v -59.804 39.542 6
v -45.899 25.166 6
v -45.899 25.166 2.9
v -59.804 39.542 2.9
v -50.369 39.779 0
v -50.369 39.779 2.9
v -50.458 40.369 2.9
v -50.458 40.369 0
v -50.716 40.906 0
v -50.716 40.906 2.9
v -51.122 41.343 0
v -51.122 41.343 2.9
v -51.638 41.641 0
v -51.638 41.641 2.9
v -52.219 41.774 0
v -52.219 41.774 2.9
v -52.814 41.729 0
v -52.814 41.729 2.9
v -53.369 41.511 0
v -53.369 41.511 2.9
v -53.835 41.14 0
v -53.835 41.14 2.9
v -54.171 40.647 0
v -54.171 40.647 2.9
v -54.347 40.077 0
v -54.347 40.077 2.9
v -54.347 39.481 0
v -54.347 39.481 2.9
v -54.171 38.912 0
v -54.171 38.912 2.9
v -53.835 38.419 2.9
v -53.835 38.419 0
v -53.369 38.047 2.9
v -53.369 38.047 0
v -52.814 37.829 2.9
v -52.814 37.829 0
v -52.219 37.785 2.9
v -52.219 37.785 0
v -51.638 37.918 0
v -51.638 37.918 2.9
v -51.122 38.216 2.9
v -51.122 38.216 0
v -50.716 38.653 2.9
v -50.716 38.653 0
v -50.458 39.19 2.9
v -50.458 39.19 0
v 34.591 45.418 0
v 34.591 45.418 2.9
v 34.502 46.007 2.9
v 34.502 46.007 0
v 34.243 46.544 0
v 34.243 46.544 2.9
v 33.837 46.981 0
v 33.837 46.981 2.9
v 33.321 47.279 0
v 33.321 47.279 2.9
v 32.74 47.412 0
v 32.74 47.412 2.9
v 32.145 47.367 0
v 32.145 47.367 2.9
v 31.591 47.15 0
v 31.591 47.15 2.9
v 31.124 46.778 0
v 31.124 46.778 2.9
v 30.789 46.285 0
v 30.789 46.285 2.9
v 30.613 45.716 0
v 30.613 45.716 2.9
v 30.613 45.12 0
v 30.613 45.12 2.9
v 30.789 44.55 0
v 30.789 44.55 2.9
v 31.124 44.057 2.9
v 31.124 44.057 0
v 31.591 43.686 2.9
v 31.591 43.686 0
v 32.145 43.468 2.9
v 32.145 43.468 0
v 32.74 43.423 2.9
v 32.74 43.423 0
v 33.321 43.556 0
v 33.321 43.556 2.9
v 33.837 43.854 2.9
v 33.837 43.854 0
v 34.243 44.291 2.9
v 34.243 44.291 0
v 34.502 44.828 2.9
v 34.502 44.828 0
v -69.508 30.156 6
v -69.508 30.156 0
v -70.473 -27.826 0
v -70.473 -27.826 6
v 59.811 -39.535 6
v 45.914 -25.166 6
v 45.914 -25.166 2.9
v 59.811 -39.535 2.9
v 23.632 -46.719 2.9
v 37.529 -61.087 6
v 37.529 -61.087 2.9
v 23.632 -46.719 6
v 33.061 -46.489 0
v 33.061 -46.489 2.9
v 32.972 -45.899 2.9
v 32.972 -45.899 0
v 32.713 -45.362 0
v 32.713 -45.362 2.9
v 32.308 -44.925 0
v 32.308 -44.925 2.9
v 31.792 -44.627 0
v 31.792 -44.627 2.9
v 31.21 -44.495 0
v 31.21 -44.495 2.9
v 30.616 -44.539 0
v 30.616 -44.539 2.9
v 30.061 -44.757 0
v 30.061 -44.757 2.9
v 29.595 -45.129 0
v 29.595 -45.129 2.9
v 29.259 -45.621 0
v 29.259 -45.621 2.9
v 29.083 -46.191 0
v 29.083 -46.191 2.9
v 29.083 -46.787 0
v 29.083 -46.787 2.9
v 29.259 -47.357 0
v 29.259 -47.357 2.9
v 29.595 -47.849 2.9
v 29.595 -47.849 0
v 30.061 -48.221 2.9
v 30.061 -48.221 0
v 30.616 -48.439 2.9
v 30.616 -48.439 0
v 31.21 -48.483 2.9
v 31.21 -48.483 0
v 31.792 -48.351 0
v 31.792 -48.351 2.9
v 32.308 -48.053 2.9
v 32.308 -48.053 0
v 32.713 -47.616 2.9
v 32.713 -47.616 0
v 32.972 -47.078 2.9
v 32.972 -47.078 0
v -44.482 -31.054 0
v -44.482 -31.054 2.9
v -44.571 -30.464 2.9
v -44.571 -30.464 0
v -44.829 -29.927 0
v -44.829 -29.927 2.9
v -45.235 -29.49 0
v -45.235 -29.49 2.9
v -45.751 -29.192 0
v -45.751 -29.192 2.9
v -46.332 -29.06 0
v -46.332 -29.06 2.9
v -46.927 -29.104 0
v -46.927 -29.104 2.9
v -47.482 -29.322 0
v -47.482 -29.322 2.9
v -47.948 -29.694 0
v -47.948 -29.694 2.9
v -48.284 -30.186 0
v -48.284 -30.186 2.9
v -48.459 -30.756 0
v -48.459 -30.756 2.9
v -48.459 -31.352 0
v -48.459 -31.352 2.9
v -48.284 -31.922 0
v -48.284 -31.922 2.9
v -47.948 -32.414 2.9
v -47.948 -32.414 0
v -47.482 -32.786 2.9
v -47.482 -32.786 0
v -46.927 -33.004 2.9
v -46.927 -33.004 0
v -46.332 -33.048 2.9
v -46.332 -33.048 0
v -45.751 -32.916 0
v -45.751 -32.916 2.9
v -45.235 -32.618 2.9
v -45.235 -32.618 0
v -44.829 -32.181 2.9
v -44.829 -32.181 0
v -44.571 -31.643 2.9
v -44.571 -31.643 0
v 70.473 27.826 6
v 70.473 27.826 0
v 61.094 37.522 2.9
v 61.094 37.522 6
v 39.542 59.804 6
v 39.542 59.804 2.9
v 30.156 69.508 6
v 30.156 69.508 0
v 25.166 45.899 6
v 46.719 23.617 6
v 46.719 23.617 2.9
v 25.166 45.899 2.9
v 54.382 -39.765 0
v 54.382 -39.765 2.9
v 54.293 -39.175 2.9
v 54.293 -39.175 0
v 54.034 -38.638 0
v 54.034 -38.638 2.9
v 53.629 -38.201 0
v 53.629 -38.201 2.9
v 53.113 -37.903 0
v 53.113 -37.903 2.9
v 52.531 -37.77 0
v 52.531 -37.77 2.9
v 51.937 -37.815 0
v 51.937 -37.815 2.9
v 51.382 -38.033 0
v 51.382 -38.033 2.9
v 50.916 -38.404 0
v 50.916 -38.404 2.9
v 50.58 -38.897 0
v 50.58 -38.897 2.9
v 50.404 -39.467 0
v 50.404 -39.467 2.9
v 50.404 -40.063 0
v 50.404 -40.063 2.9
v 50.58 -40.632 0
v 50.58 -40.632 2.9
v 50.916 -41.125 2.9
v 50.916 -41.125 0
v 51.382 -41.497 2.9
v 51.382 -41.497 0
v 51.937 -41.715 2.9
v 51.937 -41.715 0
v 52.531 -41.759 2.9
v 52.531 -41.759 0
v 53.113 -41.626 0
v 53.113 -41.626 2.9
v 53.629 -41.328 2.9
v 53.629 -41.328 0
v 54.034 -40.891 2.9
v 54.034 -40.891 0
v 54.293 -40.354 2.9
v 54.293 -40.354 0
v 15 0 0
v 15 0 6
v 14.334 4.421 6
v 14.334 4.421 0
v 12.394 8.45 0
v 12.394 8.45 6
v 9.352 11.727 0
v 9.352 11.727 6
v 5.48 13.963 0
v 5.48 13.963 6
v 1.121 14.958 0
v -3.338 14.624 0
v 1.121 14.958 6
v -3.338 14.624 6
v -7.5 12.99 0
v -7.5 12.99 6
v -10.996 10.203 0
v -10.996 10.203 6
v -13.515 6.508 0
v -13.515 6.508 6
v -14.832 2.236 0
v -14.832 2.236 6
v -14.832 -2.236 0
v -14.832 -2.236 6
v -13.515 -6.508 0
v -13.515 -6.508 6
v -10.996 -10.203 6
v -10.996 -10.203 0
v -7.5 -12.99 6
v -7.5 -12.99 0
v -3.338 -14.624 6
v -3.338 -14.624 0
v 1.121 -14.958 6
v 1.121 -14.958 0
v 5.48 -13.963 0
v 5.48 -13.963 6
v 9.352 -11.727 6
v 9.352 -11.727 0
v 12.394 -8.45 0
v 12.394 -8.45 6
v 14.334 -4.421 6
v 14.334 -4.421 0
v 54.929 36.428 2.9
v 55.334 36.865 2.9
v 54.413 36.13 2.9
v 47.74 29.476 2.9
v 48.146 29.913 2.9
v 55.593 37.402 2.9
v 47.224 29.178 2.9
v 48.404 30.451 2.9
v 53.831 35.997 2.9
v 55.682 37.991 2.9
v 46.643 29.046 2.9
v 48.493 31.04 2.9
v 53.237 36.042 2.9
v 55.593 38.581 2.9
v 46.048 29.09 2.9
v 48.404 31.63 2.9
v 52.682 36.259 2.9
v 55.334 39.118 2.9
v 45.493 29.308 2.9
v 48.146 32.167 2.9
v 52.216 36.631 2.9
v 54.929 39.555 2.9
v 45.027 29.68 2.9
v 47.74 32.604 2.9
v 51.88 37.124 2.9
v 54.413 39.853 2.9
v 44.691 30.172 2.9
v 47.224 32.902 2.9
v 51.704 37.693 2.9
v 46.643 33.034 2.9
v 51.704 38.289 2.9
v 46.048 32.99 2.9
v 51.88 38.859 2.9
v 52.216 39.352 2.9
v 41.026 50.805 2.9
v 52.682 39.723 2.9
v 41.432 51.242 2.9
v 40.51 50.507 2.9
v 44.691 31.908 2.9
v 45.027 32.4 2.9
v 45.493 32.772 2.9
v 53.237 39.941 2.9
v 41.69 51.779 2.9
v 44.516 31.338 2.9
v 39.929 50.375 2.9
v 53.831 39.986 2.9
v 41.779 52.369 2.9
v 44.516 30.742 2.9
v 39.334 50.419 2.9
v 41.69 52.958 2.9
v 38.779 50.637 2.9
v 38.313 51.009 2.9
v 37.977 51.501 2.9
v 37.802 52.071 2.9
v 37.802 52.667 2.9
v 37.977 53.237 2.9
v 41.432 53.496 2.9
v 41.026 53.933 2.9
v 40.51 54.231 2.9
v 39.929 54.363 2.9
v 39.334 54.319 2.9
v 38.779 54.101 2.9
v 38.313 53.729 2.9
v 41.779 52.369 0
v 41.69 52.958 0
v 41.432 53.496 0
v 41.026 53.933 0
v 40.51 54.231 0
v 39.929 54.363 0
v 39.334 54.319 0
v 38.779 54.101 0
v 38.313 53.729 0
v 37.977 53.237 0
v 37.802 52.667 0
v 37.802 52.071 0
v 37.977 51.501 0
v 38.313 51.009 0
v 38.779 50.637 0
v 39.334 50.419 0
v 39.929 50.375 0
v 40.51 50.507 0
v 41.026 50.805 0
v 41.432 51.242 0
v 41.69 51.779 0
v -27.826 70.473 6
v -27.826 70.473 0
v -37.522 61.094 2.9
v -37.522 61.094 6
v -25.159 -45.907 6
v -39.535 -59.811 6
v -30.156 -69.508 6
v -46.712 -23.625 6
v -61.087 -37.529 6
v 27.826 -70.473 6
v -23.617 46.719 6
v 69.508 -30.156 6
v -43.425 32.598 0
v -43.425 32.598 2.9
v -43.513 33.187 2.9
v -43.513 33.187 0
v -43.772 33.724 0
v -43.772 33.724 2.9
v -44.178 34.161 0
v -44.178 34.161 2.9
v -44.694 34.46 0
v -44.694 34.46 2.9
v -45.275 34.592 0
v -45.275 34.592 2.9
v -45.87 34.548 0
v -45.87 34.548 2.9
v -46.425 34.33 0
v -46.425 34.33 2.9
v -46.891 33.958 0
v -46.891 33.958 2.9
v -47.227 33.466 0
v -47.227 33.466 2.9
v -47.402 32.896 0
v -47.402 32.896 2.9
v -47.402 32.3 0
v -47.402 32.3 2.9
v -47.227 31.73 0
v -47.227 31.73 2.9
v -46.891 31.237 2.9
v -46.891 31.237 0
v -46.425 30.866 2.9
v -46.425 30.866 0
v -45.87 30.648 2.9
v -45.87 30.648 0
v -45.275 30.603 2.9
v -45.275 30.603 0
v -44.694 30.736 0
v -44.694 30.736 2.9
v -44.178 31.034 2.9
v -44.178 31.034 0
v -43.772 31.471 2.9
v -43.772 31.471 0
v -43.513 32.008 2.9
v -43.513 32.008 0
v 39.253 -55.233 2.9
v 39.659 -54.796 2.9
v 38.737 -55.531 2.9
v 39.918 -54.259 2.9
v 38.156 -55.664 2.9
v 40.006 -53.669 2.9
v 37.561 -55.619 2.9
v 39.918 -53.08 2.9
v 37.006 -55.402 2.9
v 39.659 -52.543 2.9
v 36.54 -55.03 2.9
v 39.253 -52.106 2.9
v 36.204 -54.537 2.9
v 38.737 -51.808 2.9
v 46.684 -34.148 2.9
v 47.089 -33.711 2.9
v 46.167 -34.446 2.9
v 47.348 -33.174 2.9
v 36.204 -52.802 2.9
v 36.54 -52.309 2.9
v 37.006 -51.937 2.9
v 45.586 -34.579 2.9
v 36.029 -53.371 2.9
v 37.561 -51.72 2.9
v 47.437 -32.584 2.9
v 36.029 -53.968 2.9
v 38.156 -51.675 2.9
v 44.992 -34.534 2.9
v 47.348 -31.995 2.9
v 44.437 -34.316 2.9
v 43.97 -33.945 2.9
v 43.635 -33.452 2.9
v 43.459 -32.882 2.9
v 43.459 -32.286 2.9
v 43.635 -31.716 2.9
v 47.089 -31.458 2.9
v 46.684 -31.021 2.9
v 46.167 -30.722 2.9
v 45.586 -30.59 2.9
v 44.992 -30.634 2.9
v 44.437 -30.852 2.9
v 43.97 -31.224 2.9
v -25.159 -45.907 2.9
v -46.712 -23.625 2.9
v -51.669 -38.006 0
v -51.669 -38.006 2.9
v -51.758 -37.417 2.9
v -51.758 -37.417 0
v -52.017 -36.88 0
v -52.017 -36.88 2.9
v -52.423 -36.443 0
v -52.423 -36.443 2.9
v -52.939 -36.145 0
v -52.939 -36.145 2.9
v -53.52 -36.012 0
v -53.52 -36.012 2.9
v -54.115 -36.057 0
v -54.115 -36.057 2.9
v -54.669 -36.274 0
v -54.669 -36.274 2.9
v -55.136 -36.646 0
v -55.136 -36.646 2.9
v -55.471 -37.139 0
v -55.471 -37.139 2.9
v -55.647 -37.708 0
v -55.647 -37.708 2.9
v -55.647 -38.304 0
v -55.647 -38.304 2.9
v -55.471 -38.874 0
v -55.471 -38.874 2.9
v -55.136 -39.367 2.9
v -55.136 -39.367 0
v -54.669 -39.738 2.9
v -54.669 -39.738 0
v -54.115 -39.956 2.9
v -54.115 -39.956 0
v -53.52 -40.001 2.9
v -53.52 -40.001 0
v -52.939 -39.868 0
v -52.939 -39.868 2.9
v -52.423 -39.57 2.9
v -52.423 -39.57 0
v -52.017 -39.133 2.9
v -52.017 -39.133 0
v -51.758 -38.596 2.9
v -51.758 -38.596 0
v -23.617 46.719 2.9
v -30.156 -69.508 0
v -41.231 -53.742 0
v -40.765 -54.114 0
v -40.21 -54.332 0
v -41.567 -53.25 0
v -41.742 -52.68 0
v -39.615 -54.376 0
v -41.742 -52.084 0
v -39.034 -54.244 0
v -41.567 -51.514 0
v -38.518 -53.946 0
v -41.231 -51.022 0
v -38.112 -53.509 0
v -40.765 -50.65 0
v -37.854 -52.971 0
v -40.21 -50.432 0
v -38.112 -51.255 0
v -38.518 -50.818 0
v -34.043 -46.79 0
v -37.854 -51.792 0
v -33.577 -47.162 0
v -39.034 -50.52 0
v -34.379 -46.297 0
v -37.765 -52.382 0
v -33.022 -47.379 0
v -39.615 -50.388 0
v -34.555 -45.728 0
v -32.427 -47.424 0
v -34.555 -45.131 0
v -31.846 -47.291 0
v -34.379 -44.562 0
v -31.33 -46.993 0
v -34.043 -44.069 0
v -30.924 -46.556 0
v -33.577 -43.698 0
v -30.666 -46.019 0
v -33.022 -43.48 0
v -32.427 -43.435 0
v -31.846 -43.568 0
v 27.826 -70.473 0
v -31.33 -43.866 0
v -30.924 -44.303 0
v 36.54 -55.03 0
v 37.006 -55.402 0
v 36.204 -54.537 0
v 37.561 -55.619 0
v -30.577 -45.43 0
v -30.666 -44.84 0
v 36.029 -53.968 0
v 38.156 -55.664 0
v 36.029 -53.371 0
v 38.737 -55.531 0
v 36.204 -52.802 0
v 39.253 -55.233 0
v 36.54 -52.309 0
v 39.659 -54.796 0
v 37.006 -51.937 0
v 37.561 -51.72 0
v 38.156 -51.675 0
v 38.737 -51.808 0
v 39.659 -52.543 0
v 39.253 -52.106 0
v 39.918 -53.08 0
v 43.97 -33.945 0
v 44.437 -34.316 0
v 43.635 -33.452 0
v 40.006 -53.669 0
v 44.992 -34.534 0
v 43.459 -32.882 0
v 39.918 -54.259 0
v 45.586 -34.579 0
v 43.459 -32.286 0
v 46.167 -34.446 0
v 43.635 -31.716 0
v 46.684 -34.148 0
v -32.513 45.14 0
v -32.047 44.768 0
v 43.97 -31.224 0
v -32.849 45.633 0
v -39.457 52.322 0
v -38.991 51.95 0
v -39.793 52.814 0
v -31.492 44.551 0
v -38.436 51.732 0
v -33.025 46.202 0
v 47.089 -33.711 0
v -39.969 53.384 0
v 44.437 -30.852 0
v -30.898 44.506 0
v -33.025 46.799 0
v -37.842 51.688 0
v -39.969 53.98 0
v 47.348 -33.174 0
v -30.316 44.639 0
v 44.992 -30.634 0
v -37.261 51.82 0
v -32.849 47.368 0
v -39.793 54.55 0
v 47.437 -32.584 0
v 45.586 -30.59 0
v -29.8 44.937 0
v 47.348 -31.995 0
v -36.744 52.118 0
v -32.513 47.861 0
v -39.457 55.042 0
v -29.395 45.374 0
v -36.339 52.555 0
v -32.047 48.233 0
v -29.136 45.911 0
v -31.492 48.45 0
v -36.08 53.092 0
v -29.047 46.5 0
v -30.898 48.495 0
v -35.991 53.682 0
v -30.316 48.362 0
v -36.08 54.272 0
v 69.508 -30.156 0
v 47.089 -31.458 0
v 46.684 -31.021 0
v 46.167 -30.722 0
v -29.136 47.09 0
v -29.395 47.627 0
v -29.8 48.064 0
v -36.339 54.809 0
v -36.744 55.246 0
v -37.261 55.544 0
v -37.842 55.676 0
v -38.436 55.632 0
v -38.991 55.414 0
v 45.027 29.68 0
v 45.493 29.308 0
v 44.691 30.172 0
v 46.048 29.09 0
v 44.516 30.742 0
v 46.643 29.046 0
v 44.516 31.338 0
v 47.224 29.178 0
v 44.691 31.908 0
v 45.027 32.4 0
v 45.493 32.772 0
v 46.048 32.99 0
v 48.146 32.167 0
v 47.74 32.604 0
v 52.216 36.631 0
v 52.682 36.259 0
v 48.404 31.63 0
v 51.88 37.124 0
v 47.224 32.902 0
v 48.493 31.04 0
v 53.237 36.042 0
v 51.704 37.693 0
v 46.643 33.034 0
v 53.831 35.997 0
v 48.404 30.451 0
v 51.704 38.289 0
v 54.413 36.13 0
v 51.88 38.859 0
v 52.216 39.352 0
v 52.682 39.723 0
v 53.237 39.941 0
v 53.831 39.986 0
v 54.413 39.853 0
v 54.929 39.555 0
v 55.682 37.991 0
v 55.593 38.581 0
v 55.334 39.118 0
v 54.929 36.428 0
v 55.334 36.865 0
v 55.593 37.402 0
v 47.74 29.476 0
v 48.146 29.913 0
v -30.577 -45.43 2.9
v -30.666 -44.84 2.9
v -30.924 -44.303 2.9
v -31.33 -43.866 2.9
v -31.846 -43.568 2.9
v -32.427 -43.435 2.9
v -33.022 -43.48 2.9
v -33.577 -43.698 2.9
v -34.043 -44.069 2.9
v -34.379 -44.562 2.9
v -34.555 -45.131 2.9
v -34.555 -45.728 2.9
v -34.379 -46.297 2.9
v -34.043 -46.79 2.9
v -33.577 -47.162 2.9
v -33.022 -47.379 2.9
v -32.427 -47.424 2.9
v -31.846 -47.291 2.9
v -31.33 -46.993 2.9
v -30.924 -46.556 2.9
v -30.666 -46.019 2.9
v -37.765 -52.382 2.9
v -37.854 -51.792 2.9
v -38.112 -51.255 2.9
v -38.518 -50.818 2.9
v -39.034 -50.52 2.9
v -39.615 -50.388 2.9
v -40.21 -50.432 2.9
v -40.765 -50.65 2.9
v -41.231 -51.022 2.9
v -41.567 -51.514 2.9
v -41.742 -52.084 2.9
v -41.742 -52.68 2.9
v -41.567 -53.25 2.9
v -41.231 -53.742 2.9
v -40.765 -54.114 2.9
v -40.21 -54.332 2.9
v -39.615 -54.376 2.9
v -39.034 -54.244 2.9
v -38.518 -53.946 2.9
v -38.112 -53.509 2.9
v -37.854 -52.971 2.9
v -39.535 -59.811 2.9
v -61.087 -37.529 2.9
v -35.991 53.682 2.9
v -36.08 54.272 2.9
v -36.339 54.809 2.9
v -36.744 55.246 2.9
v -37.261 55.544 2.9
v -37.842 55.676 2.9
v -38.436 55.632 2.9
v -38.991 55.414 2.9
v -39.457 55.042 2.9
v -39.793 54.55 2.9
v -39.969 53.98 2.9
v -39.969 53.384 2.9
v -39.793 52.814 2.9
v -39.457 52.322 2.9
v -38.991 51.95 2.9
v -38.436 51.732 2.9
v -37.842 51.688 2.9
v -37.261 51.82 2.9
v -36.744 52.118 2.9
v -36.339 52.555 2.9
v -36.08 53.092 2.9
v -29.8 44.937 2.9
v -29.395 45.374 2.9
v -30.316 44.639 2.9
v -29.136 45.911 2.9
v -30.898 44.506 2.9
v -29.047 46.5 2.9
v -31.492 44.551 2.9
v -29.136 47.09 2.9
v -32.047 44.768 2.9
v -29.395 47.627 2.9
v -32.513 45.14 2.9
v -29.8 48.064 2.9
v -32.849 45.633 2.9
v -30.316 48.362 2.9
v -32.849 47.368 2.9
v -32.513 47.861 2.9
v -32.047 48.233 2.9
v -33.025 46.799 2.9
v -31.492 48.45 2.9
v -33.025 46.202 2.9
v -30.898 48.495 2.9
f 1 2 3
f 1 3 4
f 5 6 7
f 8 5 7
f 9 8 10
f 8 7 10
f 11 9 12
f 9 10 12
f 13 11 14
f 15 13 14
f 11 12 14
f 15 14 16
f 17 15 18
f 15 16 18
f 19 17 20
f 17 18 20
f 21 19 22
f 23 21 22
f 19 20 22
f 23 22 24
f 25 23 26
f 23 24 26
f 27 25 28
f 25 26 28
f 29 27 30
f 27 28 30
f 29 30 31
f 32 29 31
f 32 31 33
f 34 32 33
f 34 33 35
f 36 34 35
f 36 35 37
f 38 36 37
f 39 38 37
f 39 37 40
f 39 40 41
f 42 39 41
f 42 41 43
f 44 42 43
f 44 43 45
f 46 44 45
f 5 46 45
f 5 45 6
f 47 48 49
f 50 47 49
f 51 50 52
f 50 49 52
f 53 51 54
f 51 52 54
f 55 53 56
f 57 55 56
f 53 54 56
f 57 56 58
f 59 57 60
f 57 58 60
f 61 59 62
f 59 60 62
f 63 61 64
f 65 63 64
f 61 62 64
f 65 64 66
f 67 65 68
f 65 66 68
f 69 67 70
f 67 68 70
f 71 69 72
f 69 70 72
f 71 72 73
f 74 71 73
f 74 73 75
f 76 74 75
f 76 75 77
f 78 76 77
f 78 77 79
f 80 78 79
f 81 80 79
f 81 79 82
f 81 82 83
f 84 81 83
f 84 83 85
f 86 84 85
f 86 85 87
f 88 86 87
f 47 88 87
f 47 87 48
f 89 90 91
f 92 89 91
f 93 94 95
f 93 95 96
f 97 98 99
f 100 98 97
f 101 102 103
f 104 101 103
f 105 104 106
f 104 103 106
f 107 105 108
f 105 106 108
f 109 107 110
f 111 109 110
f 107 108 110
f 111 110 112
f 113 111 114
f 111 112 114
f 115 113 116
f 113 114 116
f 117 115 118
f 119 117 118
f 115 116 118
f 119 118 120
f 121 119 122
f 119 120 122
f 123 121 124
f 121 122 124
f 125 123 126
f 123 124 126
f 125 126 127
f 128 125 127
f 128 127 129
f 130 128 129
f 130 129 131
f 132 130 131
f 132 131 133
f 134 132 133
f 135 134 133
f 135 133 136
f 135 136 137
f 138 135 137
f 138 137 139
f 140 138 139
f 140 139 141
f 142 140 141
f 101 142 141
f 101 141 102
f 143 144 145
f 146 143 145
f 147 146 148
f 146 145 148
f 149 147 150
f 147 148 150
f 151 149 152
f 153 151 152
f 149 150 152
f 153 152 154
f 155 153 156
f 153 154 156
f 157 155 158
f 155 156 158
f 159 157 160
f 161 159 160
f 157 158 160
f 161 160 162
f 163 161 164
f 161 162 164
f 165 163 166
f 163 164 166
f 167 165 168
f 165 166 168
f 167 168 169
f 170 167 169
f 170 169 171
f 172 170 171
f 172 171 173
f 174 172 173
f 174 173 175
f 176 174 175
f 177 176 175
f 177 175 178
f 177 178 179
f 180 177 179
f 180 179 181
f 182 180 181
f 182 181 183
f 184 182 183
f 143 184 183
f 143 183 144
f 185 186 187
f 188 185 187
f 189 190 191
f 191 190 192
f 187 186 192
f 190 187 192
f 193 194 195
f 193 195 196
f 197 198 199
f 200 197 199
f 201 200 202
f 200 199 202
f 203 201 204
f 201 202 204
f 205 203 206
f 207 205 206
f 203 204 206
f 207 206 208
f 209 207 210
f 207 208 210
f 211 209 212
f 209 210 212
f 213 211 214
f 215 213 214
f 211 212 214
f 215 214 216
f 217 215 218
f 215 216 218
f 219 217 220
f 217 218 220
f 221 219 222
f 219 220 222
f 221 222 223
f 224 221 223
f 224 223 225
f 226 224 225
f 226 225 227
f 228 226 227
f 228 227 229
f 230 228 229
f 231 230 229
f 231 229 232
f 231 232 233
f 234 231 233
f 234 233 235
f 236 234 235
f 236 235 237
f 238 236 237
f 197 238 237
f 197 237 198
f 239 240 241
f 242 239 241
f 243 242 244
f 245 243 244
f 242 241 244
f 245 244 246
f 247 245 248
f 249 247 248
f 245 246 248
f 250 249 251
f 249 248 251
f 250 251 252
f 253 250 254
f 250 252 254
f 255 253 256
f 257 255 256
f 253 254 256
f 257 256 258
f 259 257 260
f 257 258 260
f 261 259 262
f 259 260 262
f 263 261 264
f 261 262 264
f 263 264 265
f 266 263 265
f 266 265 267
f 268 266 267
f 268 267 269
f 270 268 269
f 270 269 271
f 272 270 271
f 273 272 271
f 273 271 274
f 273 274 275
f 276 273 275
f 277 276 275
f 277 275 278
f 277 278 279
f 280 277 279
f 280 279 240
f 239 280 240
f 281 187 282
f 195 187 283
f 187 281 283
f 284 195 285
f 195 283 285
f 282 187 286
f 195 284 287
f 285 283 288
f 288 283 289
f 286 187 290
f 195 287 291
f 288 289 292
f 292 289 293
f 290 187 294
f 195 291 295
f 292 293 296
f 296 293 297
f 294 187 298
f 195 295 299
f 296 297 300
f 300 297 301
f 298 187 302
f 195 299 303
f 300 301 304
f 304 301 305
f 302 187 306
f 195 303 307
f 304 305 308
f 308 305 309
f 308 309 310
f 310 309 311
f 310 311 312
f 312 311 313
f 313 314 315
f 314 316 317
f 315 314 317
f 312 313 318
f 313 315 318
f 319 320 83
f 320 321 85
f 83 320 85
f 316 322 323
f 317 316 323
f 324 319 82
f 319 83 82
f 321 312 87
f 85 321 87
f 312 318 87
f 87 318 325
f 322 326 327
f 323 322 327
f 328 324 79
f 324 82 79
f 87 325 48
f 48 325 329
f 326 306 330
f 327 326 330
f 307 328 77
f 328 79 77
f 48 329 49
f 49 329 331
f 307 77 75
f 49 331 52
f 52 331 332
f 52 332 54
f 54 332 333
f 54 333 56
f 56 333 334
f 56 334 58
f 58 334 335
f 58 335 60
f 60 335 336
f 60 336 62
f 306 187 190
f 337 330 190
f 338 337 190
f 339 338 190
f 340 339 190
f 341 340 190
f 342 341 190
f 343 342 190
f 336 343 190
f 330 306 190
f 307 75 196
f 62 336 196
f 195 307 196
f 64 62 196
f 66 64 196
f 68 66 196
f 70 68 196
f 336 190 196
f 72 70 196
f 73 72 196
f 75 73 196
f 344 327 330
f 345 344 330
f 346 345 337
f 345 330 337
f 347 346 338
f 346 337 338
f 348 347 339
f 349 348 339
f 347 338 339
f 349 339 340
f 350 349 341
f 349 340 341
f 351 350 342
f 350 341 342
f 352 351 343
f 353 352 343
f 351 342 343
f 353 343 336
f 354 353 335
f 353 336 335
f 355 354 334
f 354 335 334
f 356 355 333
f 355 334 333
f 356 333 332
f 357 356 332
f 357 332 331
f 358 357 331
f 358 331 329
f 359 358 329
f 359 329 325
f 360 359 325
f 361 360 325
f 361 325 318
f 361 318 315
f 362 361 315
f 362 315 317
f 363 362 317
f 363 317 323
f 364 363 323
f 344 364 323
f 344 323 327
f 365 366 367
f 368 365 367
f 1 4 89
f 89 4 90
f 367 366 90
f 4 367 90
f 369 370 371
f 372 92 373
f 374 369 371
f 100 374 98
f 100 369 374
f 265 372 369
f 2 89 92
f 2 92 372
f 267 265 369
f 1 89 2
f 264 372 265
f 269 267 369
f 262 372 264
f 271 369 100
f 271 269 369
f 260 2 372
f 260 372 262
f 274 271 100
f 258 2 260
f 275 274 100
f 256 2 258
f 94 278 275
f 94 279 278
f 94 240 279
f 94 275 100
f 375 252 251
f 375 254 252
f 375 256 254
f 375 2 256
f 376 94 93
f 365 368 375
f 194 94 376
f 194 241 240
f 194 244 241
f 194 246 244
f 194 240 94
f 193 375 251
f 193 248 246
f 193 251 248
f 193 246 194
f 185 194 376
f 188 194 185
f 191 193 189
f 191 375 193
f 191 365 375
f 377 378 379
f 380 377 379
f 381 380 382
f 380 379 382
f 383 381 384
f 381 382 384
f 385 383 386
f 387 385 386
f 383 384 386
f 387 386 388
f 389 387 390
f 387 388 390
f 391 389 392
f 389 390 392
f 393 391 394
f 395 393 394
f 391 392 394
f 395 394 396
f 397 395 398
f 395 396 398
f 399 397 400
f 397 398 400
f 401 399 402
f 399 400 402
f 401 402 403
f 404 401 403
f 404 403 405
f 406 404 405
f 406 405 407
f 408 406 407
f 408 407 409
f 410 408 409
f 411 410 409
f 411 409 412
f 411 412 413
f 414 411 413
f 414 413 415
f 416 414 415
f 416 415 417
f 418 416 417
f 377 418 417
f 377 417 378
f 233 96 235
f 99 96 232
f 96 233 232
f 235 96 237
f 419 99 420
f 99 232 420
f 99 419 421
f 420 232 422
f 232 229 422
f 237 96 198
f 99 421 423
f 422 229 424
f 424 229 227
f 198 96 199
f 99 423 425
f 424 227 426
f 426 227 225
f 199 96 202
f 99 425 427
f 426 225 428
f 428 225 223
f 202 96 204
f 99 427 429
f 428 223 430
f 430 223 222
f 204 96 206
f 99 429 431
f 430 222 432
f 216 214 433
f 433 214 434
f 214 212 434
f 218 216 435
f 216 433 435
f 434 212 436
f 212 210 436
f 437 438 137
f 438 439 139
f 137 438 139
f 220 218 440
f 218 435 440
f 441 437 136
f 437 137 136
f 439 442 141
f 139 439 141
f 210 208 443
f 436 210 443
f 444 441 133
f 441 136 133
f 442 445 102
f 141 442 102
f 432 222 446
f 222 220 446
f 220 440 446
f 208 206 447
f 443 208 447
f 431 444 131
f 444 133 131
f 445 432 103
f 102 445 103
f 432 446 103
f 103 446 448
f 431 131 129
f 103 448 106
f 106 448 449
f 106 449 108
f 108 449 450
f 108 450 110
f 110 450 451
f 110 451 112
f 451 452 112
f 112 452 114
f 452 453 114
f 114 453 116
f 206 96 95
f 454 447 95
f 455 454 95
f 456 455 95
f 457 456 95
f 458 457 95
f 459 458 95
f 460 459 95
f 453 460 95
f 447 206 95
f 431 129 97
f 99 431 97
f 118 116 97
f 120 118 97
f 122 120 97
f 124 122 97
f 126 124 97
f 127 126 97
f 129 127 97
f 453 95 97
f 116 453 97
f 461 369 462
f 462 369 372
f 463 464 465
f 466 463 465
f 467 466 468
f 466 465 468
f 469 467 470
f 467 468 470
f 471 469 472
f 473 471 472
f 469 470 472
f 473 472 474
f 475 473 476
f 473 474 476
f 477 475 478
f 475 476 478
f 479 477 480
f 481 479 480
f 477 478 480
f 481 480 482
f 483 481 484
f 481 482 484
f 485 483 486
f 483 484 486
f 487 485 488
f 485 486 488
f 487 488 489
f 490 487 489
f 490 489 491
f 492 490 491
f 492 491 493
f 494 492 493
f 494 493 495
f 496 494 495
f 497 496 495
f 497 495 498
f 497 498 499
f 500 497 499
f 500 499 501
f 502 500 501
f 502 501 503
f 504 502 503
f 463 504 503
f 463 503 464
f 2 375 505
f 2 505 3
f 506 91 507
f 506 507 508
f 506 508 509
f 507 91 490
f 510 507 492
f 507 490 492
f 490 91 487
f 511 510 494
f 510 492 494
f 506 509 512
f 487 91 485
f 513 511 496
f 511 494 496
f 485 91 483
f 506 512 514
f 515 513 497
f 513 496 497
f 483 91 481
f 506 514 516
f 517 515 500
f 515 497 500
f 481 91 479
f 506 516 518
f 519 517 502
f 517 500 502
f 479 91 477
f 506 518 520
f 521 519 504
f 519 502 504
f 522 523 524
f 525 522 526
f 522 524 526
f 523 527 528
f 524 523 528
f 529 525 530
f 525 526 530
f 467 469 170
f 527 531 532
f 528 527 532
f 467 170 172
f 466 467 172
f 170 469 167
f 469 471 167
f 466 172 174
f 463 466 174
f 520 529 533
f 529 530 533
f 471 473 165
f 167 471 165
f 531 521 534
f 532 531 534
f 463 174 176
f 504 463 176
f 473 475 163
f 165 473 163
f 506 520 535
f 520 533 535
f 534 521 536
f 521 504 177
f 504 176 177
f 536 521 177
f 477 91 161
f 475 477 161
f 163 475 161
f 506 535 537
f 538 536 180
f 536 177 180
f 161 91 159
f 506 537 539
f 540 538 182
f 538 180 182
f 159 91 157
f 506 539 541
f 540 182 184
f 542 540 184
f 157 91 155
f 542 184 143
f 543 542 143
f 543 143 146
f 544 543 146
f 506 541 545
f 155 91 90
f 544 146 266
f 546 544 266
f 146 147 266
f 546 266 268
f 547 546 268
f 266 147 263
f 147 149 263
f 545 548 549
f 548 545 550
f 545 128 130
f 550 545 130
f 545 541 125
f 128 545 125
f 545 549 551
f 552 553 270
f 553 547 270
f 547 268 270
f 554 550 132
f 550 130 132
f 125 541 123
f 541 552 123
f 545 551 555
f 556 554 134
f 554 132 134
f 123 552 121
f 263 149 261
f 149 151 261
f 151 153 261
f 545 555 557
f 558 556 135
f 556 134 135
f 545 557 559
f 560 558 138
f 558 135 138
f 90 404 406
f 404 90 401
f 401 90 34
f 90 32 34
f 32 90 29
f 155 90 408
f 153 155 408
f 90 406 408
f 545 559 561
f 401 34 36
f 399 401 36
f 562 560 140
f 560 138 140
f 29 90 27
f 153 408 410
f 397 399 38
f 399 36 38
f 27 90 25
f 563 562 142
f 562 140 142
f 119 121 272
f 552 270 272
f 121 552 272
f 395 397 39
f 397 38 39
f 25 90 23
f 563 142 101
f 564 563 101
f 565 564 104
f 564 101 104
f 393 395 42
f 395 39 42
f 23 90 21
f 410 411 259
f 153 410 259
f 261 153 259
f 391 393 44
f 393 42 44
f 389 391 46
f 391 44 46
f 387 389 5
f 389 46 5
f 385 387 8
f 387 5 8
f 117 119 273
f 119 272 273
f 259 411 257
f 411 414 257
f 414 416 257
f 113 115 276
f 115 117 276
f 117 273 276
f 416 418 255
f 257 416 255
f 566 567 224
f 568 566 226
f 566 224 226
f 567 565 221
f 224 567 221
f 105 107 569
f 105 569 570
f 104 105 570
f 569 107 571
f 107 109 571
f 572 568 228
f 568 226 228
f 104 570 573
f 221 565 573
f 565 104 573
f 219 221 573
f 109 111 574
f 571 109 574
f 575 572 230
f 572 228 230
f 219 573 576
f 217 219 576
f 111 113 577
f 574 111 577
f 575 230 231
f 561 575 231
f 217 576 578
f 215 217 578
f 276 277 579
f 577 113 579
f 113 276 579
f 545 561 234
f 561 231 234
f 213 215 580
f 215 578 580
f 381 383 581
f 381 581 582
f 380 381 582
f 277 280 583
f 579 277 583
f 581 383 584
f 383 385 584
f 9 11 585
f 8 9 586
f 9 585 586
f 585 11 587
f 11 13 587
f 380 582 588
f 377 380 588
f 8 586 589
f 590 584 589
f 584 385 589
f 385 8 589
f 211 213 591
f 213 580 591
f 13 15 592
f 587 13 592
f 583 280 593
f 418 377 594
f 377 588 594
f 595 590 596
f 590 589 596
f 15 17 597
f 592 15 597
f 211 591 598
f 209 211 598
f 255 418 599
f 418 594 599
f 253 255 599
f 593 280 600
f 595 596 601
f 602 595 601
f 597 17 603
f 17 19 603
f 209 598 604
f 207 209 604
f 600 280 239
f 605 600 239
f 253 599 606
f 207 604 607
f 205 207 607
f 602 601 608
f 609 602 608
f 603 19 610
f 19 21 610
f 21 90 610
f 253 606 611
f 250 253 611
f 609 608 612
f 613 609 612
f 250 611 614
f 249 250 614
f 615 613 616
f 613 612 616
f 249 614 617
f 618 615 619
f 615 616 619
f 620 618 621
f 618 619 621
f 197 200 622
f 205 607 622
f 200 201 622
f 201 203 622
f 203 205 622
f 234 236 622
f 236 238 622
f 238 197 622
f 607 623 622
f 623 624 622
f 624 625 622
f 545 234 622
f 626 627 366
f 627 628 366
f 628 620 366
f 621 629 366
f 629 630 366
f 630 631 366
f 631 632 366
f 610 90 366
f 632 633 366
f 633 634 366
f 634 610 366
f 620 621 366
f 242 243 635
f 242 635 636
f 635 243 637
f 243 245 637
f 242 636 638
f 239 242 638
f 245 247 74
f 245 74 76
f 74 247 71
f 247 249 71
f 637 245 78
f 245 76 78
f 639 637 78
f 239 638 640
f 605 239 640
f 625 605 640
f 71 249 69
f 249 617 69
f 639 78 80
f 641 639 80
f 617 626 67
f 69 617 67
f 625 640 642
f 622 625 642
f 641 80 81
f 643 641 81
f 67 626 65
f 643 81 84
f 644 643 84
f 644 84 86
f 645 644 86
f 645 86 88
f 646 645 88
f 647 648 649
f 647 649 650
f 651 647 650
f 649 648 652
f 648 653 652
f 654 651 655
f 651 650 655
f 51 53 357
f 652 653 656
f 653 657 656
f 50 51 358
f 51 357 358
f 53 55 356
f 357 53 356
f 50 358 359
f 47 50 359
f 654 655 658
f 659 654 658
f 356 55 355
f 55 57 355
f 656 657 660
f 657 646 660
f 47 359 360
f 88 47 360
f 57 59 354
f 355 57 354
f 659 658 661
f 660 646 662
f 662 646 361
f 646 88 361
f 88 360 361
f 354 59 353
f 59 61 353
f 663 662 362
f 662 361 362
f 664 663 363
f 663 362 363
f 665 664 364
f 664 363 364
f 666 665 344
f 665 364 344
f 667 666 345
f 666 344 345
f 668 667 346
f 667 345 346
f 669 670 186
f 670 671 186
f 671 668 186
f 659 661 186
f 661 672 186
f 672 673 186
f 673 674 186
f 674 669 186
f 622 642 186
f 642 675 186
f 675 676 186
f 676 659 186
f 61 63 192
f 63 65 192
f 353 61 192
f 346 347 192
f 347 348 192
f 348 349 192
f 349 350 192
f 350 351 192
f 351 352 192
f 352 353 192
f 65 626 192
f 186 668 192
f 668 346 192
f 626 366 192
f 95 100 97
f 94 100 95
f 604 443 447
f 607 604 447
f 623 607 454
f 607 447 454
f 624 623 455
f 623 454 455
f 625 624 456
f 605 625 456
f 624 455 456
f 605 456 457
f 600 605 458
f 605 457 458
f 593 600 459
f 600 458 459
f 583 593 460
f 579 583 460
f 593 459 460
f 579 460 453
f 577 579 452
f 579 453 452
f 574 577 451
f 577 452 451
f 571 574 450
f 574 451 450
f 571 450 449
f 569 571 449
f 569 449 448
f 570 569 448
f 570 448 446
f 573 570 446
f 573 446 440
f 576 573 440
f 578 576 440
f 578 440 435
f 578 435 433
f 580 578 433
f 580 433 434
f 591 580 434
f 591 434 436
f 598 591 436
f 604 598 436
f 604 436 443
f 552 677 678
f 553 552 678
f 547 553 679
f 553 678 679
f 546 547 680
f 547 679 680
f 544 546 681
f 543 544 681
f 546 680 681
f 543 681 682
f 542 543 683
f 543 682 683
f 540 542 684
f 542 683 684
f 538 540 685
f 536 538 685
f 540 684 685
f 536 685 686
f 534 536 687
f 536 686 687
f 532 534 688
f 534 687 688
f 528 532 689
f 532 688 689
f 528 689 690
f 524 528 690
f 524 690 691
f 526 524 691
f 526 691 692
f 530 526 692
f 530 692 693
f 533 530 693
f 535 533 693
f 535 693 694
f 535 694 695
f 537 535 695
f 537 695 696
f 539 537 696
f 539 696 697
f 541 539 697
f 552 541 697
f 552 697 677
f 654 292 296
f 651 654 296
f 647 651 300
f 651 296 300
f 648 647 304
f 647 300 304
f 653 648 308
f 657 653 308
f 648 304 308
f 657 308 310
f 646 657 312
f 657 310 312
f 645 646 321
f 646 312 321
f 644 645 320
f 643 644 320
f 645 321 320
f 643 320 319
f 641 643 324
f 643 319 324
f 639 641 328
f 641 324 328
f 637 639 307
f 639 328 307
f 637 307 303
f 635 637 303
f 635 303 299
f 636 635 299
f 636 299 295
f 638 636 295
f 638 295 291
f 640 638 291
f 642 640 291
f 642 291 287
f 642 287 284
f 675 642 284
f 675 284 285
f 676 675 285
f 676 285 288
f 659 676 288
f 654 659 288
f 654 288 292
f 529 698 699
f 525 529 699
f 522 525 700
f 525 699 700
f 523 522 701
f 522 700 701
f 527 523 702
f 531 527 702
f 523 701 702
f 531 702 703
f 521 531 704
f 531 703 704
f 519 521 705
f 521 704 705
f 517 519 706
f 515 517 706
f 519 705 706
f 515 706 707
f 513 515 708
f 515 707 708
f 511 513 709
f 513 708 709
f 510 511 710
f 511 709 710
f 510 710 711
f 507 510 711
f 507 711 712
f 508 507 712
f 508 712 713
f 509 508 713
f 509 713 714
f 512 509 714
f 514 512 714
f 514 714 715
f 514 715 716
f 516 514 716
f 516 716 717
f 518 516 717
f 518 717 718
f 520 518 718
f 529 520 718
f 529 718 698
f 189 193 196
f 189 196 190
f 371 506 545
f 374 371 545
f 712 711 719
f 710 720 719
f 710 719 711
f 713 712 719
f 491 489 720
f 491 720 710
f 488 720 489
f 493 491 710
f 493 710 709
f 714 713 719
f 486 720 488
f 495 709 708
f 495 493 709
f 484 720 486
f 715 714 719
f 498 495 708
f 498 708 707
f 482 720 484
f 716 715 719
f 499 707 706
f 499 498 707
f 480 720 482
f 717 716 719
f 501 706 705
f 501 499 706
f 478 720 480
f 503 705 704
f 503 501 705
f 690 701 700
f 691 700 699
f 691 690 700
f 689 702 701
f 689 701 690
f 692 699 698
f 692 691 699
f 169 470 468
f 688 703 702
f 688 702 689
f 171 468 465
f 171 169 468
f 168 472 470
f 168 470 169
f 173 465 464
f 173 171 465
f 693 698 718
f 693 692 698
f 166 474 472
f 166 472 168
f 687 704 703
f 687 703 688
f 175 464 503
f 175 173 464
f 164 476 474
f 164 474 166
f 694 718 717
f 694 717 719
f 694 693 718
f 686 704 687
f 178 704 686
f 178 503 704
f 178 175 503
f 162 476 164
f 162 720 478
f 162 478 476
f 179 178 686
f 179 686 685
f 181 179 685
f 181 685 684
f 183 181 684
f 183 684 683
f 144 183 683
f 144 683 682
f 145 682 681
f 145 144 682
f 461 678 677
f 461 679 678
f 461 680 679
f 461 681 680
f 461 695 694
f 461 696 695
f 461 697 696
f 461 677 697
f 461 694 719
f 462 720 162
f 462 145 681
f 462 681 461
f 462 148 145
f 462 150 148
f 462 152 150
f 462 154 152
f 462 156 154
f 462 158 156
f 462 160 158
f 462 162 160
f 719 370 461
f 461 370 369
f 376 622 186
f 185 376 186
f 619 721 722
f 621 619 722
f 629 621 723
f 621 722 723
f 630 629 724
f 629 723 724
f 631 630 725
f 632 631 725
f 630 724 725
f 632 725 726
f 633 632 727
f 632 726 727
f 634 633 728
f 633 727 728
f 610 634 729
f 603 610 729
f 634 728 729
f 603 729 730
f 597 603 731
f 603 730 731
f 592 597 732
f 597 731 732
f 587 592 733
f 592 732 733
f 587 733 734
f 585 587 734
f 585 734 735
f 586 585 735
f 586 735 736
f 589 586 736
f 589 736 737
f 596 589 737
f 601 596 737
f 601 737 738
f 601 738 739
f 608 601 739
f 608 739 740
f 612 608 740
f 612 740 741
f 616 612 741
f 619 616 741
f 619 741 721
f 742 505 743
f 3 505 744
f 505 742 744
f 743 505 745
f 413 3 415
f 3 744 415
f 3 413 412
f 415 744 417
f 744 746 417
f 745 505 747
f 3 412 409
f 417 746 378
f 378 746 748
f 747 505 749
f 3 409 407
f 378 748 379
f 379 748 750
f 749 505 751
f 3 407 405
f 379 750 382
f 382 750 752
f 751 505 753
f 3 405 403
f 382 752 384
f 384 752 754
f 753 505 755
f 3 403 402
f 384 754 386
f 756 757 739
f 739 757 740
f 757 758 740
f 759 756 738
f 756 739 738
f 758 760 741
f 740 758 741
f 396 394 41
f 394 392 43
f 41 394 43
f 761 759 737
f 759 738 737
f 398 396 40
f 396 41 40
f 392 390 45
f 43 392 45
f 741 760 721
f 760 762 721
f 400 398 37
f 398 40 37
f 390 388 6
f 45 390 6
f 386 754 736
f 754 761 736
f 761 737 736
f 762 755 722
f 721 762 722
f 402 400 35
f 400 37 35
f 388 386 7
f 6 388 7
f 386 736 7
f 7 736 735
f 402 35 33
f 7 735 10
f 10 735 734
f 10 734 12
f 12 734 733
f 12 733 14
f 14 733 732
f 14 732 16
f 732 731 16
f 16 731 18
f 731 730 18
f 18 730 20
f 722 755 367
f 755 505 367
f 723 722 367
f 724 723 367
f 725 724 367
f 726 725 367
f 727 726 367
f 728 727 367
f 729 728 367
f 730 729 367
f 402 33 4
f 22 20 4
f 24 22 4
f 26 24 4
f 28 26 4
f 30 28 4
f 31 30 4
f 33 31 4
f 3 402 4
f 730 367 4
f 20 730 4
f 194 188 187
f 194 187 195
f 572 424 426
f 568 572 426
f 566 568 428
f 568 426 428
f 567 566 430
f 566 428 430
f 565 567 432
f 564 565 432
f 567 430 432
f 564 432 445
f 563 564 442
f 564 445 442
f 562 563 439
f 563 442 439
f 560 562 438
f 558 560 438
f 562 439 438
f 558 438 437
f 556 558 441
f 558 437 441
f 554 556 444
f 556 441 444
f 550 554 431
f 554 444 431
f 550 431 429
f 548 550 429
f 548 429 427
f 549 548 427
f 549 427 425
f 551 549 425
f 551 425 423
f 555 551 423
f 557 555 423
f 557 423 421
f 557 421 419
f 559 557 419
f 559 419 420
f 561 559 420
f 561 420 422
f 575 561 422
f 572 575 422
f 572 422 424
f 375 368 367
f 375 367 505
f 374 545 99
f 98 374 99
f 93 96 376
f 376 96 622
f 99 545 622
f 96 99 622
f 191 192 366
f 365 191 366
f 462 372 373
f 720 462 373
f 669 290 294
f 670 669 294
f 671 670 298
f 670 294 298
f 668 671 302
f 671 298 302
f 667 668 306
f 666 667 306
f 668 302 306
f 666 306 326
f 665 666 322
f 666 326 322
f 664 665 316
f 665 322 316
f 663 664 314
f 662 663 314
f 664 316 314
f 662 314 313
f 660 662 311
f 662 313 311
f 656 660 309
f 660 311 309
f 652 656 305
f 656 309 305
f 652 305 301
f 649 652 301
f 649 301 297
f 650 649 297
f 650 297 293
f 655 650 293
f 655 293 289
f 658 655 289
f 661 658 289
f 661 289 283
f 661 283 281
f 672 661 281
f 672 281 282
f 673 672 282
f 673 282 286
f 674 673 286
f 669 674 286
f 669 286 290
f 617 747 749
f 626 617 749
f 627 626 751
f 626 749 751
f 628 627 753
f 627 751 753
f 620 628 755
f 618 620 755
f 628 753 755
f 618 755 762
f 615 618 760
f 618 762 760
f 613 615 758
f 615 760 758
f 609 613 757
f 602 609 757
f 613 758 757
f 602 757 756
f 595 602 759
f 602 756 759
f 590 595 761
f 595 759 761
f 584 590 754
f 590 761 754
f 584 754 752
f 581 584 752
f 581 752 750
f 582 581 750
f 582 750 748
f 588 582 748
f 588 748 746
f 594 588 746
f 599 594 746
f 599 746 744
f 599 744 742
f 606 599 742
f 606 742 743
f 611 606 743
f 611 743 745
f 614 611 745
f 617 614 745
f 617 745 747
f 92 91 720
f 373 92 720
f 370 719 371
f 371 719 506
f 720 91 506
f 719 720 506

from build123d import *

# Parameters (mm, degrees)
RESSALTO_EXTRUS_O1_DEPTH = 6
CORTE_EXTRUS_O1_DEPTH    = 3.1
ESBO_O4_R                = 15
CORTE_EXTRUS_O2_DEPTH    = 100.844211363
ESBO_O6_R                = 2
CORTE_EXTRUS_O3_DEPTH    = 3.1


with BuildPart() as part:
    # Esboço2 → Ressalto-extrusão1 (new body)
    with BuildSketch(Plane.XY):
        Polygon((70.472925804, 27.825776133), (30.15608873, 69.507678721), (-27.825776133, 70.472925804), (-69.507678721, 30.15608873), (-70.472925804, -27.825776133), (-30.15608873, -69.507678721), (27.825776133, -70.472925804), (69.507678721, -30.15608873), align=None)
    extrude(amount=RESSALTO_EXTRUS_O1_DEPTH)

    # Esboço3 → Corte-extrusão1 (cut)
    with BuildSketch(Plane.XY.offset(6)):
        Polygon((-61.0871998, -37.529288249), (-39.534791939, -59.811427182), (-25.159218434, -45.906647917), (-46.711626295, -23.624508984), align=None)
        Polygon((46.71864909, 23.617248408), (25.166241229, 45.899387341), (39.541814734, 59.804166606), (61.094222595, 37.522027673), align=None)
        Polygon((-59.804166606, 39.541814734), (-37.522027673, 61.094222595), (-23.617248408, 46.71864909), (-45.899387341, 25.166241229), align=None)
        Polygon((23.631531779, -46.718886871), (45.913670712, -25.16647901), (59.818449977, -39.542052515), (37.536311044, -61.094460376), align=None)
    extrude(amount=-CORTE_EXTRUS_O1_DEPTH, mode=Mode.SUBTRACT)

    # Esboço4 → Corte-extrusão2 (cut, through all)
    with BuildSketch(Plane.XY.offset(6)):
        Circle(ESBO_O4_R)
    extrude(amount=-CORTE_EXTRUS_O2_DEPTH, mode=Mode.SUBTRACT)

    # Esboço6 → Corte-extrusão3 (cut)
    with BuildSketch(Plane.XY.offset(2.9)):
        with Locations((-46.481705373, -31.053986514)):
            Circle(ESBO_O6_R)
        with Locations((-53.669492126, -38.006376147)):
            Circle(ESBO_O6_R)
        with Locations((-39.764712861, -52.381949652)):
            Circle(ESBO_O6_R)
        with Locations((-32.576926108, -45.429560019)):
            Circle(ESBO_O6_R)
        with Locations((39.779293109, 52.368949317)):
            Circle(ESBO_O6_R)
        with Locations((32.590503175, 45.417596982)):
            Circle(ESBO_O6_R)
        with Locations((53.681997779, 37.991369449)):
            Circle(ESBO_O6_R)
        with Locations((46.493207845, 31.040017114)):
            Circle(ESBO_O6_R)
        with Locations((38.006376147, -53.669492126)):
            Circle(ESBO_O6_R)
        with Locations((31.061009309, -46.488965949)):
            Circle(ESBO_O6_R)
        with Locations((52.381949652, -39.764712861)):
            Circle(ESBO_O6_R)
        with Locations((45.436582814, -32.584186684)):
            Circle(ESBO_O6_R)
        with Locations((-37.991369449, 53.681997779)):
            Circle(ESBO_O6_R)
        with Locations((-31.047038861, 46.500469435)):
            Circle(ESBO_O6_R)
        with Locations((-45.424618729, 32.597764765)):
            Circle(ESBO_O6_R)
        with Locations((-52.368949317, 39.779293109)):
            Circle(ESBO_O6_R)
    extrude(amount=-CORTE_EXTRUS_O3_DEPTH, mode=Mode.SUBTRACT)


solid = part.part
